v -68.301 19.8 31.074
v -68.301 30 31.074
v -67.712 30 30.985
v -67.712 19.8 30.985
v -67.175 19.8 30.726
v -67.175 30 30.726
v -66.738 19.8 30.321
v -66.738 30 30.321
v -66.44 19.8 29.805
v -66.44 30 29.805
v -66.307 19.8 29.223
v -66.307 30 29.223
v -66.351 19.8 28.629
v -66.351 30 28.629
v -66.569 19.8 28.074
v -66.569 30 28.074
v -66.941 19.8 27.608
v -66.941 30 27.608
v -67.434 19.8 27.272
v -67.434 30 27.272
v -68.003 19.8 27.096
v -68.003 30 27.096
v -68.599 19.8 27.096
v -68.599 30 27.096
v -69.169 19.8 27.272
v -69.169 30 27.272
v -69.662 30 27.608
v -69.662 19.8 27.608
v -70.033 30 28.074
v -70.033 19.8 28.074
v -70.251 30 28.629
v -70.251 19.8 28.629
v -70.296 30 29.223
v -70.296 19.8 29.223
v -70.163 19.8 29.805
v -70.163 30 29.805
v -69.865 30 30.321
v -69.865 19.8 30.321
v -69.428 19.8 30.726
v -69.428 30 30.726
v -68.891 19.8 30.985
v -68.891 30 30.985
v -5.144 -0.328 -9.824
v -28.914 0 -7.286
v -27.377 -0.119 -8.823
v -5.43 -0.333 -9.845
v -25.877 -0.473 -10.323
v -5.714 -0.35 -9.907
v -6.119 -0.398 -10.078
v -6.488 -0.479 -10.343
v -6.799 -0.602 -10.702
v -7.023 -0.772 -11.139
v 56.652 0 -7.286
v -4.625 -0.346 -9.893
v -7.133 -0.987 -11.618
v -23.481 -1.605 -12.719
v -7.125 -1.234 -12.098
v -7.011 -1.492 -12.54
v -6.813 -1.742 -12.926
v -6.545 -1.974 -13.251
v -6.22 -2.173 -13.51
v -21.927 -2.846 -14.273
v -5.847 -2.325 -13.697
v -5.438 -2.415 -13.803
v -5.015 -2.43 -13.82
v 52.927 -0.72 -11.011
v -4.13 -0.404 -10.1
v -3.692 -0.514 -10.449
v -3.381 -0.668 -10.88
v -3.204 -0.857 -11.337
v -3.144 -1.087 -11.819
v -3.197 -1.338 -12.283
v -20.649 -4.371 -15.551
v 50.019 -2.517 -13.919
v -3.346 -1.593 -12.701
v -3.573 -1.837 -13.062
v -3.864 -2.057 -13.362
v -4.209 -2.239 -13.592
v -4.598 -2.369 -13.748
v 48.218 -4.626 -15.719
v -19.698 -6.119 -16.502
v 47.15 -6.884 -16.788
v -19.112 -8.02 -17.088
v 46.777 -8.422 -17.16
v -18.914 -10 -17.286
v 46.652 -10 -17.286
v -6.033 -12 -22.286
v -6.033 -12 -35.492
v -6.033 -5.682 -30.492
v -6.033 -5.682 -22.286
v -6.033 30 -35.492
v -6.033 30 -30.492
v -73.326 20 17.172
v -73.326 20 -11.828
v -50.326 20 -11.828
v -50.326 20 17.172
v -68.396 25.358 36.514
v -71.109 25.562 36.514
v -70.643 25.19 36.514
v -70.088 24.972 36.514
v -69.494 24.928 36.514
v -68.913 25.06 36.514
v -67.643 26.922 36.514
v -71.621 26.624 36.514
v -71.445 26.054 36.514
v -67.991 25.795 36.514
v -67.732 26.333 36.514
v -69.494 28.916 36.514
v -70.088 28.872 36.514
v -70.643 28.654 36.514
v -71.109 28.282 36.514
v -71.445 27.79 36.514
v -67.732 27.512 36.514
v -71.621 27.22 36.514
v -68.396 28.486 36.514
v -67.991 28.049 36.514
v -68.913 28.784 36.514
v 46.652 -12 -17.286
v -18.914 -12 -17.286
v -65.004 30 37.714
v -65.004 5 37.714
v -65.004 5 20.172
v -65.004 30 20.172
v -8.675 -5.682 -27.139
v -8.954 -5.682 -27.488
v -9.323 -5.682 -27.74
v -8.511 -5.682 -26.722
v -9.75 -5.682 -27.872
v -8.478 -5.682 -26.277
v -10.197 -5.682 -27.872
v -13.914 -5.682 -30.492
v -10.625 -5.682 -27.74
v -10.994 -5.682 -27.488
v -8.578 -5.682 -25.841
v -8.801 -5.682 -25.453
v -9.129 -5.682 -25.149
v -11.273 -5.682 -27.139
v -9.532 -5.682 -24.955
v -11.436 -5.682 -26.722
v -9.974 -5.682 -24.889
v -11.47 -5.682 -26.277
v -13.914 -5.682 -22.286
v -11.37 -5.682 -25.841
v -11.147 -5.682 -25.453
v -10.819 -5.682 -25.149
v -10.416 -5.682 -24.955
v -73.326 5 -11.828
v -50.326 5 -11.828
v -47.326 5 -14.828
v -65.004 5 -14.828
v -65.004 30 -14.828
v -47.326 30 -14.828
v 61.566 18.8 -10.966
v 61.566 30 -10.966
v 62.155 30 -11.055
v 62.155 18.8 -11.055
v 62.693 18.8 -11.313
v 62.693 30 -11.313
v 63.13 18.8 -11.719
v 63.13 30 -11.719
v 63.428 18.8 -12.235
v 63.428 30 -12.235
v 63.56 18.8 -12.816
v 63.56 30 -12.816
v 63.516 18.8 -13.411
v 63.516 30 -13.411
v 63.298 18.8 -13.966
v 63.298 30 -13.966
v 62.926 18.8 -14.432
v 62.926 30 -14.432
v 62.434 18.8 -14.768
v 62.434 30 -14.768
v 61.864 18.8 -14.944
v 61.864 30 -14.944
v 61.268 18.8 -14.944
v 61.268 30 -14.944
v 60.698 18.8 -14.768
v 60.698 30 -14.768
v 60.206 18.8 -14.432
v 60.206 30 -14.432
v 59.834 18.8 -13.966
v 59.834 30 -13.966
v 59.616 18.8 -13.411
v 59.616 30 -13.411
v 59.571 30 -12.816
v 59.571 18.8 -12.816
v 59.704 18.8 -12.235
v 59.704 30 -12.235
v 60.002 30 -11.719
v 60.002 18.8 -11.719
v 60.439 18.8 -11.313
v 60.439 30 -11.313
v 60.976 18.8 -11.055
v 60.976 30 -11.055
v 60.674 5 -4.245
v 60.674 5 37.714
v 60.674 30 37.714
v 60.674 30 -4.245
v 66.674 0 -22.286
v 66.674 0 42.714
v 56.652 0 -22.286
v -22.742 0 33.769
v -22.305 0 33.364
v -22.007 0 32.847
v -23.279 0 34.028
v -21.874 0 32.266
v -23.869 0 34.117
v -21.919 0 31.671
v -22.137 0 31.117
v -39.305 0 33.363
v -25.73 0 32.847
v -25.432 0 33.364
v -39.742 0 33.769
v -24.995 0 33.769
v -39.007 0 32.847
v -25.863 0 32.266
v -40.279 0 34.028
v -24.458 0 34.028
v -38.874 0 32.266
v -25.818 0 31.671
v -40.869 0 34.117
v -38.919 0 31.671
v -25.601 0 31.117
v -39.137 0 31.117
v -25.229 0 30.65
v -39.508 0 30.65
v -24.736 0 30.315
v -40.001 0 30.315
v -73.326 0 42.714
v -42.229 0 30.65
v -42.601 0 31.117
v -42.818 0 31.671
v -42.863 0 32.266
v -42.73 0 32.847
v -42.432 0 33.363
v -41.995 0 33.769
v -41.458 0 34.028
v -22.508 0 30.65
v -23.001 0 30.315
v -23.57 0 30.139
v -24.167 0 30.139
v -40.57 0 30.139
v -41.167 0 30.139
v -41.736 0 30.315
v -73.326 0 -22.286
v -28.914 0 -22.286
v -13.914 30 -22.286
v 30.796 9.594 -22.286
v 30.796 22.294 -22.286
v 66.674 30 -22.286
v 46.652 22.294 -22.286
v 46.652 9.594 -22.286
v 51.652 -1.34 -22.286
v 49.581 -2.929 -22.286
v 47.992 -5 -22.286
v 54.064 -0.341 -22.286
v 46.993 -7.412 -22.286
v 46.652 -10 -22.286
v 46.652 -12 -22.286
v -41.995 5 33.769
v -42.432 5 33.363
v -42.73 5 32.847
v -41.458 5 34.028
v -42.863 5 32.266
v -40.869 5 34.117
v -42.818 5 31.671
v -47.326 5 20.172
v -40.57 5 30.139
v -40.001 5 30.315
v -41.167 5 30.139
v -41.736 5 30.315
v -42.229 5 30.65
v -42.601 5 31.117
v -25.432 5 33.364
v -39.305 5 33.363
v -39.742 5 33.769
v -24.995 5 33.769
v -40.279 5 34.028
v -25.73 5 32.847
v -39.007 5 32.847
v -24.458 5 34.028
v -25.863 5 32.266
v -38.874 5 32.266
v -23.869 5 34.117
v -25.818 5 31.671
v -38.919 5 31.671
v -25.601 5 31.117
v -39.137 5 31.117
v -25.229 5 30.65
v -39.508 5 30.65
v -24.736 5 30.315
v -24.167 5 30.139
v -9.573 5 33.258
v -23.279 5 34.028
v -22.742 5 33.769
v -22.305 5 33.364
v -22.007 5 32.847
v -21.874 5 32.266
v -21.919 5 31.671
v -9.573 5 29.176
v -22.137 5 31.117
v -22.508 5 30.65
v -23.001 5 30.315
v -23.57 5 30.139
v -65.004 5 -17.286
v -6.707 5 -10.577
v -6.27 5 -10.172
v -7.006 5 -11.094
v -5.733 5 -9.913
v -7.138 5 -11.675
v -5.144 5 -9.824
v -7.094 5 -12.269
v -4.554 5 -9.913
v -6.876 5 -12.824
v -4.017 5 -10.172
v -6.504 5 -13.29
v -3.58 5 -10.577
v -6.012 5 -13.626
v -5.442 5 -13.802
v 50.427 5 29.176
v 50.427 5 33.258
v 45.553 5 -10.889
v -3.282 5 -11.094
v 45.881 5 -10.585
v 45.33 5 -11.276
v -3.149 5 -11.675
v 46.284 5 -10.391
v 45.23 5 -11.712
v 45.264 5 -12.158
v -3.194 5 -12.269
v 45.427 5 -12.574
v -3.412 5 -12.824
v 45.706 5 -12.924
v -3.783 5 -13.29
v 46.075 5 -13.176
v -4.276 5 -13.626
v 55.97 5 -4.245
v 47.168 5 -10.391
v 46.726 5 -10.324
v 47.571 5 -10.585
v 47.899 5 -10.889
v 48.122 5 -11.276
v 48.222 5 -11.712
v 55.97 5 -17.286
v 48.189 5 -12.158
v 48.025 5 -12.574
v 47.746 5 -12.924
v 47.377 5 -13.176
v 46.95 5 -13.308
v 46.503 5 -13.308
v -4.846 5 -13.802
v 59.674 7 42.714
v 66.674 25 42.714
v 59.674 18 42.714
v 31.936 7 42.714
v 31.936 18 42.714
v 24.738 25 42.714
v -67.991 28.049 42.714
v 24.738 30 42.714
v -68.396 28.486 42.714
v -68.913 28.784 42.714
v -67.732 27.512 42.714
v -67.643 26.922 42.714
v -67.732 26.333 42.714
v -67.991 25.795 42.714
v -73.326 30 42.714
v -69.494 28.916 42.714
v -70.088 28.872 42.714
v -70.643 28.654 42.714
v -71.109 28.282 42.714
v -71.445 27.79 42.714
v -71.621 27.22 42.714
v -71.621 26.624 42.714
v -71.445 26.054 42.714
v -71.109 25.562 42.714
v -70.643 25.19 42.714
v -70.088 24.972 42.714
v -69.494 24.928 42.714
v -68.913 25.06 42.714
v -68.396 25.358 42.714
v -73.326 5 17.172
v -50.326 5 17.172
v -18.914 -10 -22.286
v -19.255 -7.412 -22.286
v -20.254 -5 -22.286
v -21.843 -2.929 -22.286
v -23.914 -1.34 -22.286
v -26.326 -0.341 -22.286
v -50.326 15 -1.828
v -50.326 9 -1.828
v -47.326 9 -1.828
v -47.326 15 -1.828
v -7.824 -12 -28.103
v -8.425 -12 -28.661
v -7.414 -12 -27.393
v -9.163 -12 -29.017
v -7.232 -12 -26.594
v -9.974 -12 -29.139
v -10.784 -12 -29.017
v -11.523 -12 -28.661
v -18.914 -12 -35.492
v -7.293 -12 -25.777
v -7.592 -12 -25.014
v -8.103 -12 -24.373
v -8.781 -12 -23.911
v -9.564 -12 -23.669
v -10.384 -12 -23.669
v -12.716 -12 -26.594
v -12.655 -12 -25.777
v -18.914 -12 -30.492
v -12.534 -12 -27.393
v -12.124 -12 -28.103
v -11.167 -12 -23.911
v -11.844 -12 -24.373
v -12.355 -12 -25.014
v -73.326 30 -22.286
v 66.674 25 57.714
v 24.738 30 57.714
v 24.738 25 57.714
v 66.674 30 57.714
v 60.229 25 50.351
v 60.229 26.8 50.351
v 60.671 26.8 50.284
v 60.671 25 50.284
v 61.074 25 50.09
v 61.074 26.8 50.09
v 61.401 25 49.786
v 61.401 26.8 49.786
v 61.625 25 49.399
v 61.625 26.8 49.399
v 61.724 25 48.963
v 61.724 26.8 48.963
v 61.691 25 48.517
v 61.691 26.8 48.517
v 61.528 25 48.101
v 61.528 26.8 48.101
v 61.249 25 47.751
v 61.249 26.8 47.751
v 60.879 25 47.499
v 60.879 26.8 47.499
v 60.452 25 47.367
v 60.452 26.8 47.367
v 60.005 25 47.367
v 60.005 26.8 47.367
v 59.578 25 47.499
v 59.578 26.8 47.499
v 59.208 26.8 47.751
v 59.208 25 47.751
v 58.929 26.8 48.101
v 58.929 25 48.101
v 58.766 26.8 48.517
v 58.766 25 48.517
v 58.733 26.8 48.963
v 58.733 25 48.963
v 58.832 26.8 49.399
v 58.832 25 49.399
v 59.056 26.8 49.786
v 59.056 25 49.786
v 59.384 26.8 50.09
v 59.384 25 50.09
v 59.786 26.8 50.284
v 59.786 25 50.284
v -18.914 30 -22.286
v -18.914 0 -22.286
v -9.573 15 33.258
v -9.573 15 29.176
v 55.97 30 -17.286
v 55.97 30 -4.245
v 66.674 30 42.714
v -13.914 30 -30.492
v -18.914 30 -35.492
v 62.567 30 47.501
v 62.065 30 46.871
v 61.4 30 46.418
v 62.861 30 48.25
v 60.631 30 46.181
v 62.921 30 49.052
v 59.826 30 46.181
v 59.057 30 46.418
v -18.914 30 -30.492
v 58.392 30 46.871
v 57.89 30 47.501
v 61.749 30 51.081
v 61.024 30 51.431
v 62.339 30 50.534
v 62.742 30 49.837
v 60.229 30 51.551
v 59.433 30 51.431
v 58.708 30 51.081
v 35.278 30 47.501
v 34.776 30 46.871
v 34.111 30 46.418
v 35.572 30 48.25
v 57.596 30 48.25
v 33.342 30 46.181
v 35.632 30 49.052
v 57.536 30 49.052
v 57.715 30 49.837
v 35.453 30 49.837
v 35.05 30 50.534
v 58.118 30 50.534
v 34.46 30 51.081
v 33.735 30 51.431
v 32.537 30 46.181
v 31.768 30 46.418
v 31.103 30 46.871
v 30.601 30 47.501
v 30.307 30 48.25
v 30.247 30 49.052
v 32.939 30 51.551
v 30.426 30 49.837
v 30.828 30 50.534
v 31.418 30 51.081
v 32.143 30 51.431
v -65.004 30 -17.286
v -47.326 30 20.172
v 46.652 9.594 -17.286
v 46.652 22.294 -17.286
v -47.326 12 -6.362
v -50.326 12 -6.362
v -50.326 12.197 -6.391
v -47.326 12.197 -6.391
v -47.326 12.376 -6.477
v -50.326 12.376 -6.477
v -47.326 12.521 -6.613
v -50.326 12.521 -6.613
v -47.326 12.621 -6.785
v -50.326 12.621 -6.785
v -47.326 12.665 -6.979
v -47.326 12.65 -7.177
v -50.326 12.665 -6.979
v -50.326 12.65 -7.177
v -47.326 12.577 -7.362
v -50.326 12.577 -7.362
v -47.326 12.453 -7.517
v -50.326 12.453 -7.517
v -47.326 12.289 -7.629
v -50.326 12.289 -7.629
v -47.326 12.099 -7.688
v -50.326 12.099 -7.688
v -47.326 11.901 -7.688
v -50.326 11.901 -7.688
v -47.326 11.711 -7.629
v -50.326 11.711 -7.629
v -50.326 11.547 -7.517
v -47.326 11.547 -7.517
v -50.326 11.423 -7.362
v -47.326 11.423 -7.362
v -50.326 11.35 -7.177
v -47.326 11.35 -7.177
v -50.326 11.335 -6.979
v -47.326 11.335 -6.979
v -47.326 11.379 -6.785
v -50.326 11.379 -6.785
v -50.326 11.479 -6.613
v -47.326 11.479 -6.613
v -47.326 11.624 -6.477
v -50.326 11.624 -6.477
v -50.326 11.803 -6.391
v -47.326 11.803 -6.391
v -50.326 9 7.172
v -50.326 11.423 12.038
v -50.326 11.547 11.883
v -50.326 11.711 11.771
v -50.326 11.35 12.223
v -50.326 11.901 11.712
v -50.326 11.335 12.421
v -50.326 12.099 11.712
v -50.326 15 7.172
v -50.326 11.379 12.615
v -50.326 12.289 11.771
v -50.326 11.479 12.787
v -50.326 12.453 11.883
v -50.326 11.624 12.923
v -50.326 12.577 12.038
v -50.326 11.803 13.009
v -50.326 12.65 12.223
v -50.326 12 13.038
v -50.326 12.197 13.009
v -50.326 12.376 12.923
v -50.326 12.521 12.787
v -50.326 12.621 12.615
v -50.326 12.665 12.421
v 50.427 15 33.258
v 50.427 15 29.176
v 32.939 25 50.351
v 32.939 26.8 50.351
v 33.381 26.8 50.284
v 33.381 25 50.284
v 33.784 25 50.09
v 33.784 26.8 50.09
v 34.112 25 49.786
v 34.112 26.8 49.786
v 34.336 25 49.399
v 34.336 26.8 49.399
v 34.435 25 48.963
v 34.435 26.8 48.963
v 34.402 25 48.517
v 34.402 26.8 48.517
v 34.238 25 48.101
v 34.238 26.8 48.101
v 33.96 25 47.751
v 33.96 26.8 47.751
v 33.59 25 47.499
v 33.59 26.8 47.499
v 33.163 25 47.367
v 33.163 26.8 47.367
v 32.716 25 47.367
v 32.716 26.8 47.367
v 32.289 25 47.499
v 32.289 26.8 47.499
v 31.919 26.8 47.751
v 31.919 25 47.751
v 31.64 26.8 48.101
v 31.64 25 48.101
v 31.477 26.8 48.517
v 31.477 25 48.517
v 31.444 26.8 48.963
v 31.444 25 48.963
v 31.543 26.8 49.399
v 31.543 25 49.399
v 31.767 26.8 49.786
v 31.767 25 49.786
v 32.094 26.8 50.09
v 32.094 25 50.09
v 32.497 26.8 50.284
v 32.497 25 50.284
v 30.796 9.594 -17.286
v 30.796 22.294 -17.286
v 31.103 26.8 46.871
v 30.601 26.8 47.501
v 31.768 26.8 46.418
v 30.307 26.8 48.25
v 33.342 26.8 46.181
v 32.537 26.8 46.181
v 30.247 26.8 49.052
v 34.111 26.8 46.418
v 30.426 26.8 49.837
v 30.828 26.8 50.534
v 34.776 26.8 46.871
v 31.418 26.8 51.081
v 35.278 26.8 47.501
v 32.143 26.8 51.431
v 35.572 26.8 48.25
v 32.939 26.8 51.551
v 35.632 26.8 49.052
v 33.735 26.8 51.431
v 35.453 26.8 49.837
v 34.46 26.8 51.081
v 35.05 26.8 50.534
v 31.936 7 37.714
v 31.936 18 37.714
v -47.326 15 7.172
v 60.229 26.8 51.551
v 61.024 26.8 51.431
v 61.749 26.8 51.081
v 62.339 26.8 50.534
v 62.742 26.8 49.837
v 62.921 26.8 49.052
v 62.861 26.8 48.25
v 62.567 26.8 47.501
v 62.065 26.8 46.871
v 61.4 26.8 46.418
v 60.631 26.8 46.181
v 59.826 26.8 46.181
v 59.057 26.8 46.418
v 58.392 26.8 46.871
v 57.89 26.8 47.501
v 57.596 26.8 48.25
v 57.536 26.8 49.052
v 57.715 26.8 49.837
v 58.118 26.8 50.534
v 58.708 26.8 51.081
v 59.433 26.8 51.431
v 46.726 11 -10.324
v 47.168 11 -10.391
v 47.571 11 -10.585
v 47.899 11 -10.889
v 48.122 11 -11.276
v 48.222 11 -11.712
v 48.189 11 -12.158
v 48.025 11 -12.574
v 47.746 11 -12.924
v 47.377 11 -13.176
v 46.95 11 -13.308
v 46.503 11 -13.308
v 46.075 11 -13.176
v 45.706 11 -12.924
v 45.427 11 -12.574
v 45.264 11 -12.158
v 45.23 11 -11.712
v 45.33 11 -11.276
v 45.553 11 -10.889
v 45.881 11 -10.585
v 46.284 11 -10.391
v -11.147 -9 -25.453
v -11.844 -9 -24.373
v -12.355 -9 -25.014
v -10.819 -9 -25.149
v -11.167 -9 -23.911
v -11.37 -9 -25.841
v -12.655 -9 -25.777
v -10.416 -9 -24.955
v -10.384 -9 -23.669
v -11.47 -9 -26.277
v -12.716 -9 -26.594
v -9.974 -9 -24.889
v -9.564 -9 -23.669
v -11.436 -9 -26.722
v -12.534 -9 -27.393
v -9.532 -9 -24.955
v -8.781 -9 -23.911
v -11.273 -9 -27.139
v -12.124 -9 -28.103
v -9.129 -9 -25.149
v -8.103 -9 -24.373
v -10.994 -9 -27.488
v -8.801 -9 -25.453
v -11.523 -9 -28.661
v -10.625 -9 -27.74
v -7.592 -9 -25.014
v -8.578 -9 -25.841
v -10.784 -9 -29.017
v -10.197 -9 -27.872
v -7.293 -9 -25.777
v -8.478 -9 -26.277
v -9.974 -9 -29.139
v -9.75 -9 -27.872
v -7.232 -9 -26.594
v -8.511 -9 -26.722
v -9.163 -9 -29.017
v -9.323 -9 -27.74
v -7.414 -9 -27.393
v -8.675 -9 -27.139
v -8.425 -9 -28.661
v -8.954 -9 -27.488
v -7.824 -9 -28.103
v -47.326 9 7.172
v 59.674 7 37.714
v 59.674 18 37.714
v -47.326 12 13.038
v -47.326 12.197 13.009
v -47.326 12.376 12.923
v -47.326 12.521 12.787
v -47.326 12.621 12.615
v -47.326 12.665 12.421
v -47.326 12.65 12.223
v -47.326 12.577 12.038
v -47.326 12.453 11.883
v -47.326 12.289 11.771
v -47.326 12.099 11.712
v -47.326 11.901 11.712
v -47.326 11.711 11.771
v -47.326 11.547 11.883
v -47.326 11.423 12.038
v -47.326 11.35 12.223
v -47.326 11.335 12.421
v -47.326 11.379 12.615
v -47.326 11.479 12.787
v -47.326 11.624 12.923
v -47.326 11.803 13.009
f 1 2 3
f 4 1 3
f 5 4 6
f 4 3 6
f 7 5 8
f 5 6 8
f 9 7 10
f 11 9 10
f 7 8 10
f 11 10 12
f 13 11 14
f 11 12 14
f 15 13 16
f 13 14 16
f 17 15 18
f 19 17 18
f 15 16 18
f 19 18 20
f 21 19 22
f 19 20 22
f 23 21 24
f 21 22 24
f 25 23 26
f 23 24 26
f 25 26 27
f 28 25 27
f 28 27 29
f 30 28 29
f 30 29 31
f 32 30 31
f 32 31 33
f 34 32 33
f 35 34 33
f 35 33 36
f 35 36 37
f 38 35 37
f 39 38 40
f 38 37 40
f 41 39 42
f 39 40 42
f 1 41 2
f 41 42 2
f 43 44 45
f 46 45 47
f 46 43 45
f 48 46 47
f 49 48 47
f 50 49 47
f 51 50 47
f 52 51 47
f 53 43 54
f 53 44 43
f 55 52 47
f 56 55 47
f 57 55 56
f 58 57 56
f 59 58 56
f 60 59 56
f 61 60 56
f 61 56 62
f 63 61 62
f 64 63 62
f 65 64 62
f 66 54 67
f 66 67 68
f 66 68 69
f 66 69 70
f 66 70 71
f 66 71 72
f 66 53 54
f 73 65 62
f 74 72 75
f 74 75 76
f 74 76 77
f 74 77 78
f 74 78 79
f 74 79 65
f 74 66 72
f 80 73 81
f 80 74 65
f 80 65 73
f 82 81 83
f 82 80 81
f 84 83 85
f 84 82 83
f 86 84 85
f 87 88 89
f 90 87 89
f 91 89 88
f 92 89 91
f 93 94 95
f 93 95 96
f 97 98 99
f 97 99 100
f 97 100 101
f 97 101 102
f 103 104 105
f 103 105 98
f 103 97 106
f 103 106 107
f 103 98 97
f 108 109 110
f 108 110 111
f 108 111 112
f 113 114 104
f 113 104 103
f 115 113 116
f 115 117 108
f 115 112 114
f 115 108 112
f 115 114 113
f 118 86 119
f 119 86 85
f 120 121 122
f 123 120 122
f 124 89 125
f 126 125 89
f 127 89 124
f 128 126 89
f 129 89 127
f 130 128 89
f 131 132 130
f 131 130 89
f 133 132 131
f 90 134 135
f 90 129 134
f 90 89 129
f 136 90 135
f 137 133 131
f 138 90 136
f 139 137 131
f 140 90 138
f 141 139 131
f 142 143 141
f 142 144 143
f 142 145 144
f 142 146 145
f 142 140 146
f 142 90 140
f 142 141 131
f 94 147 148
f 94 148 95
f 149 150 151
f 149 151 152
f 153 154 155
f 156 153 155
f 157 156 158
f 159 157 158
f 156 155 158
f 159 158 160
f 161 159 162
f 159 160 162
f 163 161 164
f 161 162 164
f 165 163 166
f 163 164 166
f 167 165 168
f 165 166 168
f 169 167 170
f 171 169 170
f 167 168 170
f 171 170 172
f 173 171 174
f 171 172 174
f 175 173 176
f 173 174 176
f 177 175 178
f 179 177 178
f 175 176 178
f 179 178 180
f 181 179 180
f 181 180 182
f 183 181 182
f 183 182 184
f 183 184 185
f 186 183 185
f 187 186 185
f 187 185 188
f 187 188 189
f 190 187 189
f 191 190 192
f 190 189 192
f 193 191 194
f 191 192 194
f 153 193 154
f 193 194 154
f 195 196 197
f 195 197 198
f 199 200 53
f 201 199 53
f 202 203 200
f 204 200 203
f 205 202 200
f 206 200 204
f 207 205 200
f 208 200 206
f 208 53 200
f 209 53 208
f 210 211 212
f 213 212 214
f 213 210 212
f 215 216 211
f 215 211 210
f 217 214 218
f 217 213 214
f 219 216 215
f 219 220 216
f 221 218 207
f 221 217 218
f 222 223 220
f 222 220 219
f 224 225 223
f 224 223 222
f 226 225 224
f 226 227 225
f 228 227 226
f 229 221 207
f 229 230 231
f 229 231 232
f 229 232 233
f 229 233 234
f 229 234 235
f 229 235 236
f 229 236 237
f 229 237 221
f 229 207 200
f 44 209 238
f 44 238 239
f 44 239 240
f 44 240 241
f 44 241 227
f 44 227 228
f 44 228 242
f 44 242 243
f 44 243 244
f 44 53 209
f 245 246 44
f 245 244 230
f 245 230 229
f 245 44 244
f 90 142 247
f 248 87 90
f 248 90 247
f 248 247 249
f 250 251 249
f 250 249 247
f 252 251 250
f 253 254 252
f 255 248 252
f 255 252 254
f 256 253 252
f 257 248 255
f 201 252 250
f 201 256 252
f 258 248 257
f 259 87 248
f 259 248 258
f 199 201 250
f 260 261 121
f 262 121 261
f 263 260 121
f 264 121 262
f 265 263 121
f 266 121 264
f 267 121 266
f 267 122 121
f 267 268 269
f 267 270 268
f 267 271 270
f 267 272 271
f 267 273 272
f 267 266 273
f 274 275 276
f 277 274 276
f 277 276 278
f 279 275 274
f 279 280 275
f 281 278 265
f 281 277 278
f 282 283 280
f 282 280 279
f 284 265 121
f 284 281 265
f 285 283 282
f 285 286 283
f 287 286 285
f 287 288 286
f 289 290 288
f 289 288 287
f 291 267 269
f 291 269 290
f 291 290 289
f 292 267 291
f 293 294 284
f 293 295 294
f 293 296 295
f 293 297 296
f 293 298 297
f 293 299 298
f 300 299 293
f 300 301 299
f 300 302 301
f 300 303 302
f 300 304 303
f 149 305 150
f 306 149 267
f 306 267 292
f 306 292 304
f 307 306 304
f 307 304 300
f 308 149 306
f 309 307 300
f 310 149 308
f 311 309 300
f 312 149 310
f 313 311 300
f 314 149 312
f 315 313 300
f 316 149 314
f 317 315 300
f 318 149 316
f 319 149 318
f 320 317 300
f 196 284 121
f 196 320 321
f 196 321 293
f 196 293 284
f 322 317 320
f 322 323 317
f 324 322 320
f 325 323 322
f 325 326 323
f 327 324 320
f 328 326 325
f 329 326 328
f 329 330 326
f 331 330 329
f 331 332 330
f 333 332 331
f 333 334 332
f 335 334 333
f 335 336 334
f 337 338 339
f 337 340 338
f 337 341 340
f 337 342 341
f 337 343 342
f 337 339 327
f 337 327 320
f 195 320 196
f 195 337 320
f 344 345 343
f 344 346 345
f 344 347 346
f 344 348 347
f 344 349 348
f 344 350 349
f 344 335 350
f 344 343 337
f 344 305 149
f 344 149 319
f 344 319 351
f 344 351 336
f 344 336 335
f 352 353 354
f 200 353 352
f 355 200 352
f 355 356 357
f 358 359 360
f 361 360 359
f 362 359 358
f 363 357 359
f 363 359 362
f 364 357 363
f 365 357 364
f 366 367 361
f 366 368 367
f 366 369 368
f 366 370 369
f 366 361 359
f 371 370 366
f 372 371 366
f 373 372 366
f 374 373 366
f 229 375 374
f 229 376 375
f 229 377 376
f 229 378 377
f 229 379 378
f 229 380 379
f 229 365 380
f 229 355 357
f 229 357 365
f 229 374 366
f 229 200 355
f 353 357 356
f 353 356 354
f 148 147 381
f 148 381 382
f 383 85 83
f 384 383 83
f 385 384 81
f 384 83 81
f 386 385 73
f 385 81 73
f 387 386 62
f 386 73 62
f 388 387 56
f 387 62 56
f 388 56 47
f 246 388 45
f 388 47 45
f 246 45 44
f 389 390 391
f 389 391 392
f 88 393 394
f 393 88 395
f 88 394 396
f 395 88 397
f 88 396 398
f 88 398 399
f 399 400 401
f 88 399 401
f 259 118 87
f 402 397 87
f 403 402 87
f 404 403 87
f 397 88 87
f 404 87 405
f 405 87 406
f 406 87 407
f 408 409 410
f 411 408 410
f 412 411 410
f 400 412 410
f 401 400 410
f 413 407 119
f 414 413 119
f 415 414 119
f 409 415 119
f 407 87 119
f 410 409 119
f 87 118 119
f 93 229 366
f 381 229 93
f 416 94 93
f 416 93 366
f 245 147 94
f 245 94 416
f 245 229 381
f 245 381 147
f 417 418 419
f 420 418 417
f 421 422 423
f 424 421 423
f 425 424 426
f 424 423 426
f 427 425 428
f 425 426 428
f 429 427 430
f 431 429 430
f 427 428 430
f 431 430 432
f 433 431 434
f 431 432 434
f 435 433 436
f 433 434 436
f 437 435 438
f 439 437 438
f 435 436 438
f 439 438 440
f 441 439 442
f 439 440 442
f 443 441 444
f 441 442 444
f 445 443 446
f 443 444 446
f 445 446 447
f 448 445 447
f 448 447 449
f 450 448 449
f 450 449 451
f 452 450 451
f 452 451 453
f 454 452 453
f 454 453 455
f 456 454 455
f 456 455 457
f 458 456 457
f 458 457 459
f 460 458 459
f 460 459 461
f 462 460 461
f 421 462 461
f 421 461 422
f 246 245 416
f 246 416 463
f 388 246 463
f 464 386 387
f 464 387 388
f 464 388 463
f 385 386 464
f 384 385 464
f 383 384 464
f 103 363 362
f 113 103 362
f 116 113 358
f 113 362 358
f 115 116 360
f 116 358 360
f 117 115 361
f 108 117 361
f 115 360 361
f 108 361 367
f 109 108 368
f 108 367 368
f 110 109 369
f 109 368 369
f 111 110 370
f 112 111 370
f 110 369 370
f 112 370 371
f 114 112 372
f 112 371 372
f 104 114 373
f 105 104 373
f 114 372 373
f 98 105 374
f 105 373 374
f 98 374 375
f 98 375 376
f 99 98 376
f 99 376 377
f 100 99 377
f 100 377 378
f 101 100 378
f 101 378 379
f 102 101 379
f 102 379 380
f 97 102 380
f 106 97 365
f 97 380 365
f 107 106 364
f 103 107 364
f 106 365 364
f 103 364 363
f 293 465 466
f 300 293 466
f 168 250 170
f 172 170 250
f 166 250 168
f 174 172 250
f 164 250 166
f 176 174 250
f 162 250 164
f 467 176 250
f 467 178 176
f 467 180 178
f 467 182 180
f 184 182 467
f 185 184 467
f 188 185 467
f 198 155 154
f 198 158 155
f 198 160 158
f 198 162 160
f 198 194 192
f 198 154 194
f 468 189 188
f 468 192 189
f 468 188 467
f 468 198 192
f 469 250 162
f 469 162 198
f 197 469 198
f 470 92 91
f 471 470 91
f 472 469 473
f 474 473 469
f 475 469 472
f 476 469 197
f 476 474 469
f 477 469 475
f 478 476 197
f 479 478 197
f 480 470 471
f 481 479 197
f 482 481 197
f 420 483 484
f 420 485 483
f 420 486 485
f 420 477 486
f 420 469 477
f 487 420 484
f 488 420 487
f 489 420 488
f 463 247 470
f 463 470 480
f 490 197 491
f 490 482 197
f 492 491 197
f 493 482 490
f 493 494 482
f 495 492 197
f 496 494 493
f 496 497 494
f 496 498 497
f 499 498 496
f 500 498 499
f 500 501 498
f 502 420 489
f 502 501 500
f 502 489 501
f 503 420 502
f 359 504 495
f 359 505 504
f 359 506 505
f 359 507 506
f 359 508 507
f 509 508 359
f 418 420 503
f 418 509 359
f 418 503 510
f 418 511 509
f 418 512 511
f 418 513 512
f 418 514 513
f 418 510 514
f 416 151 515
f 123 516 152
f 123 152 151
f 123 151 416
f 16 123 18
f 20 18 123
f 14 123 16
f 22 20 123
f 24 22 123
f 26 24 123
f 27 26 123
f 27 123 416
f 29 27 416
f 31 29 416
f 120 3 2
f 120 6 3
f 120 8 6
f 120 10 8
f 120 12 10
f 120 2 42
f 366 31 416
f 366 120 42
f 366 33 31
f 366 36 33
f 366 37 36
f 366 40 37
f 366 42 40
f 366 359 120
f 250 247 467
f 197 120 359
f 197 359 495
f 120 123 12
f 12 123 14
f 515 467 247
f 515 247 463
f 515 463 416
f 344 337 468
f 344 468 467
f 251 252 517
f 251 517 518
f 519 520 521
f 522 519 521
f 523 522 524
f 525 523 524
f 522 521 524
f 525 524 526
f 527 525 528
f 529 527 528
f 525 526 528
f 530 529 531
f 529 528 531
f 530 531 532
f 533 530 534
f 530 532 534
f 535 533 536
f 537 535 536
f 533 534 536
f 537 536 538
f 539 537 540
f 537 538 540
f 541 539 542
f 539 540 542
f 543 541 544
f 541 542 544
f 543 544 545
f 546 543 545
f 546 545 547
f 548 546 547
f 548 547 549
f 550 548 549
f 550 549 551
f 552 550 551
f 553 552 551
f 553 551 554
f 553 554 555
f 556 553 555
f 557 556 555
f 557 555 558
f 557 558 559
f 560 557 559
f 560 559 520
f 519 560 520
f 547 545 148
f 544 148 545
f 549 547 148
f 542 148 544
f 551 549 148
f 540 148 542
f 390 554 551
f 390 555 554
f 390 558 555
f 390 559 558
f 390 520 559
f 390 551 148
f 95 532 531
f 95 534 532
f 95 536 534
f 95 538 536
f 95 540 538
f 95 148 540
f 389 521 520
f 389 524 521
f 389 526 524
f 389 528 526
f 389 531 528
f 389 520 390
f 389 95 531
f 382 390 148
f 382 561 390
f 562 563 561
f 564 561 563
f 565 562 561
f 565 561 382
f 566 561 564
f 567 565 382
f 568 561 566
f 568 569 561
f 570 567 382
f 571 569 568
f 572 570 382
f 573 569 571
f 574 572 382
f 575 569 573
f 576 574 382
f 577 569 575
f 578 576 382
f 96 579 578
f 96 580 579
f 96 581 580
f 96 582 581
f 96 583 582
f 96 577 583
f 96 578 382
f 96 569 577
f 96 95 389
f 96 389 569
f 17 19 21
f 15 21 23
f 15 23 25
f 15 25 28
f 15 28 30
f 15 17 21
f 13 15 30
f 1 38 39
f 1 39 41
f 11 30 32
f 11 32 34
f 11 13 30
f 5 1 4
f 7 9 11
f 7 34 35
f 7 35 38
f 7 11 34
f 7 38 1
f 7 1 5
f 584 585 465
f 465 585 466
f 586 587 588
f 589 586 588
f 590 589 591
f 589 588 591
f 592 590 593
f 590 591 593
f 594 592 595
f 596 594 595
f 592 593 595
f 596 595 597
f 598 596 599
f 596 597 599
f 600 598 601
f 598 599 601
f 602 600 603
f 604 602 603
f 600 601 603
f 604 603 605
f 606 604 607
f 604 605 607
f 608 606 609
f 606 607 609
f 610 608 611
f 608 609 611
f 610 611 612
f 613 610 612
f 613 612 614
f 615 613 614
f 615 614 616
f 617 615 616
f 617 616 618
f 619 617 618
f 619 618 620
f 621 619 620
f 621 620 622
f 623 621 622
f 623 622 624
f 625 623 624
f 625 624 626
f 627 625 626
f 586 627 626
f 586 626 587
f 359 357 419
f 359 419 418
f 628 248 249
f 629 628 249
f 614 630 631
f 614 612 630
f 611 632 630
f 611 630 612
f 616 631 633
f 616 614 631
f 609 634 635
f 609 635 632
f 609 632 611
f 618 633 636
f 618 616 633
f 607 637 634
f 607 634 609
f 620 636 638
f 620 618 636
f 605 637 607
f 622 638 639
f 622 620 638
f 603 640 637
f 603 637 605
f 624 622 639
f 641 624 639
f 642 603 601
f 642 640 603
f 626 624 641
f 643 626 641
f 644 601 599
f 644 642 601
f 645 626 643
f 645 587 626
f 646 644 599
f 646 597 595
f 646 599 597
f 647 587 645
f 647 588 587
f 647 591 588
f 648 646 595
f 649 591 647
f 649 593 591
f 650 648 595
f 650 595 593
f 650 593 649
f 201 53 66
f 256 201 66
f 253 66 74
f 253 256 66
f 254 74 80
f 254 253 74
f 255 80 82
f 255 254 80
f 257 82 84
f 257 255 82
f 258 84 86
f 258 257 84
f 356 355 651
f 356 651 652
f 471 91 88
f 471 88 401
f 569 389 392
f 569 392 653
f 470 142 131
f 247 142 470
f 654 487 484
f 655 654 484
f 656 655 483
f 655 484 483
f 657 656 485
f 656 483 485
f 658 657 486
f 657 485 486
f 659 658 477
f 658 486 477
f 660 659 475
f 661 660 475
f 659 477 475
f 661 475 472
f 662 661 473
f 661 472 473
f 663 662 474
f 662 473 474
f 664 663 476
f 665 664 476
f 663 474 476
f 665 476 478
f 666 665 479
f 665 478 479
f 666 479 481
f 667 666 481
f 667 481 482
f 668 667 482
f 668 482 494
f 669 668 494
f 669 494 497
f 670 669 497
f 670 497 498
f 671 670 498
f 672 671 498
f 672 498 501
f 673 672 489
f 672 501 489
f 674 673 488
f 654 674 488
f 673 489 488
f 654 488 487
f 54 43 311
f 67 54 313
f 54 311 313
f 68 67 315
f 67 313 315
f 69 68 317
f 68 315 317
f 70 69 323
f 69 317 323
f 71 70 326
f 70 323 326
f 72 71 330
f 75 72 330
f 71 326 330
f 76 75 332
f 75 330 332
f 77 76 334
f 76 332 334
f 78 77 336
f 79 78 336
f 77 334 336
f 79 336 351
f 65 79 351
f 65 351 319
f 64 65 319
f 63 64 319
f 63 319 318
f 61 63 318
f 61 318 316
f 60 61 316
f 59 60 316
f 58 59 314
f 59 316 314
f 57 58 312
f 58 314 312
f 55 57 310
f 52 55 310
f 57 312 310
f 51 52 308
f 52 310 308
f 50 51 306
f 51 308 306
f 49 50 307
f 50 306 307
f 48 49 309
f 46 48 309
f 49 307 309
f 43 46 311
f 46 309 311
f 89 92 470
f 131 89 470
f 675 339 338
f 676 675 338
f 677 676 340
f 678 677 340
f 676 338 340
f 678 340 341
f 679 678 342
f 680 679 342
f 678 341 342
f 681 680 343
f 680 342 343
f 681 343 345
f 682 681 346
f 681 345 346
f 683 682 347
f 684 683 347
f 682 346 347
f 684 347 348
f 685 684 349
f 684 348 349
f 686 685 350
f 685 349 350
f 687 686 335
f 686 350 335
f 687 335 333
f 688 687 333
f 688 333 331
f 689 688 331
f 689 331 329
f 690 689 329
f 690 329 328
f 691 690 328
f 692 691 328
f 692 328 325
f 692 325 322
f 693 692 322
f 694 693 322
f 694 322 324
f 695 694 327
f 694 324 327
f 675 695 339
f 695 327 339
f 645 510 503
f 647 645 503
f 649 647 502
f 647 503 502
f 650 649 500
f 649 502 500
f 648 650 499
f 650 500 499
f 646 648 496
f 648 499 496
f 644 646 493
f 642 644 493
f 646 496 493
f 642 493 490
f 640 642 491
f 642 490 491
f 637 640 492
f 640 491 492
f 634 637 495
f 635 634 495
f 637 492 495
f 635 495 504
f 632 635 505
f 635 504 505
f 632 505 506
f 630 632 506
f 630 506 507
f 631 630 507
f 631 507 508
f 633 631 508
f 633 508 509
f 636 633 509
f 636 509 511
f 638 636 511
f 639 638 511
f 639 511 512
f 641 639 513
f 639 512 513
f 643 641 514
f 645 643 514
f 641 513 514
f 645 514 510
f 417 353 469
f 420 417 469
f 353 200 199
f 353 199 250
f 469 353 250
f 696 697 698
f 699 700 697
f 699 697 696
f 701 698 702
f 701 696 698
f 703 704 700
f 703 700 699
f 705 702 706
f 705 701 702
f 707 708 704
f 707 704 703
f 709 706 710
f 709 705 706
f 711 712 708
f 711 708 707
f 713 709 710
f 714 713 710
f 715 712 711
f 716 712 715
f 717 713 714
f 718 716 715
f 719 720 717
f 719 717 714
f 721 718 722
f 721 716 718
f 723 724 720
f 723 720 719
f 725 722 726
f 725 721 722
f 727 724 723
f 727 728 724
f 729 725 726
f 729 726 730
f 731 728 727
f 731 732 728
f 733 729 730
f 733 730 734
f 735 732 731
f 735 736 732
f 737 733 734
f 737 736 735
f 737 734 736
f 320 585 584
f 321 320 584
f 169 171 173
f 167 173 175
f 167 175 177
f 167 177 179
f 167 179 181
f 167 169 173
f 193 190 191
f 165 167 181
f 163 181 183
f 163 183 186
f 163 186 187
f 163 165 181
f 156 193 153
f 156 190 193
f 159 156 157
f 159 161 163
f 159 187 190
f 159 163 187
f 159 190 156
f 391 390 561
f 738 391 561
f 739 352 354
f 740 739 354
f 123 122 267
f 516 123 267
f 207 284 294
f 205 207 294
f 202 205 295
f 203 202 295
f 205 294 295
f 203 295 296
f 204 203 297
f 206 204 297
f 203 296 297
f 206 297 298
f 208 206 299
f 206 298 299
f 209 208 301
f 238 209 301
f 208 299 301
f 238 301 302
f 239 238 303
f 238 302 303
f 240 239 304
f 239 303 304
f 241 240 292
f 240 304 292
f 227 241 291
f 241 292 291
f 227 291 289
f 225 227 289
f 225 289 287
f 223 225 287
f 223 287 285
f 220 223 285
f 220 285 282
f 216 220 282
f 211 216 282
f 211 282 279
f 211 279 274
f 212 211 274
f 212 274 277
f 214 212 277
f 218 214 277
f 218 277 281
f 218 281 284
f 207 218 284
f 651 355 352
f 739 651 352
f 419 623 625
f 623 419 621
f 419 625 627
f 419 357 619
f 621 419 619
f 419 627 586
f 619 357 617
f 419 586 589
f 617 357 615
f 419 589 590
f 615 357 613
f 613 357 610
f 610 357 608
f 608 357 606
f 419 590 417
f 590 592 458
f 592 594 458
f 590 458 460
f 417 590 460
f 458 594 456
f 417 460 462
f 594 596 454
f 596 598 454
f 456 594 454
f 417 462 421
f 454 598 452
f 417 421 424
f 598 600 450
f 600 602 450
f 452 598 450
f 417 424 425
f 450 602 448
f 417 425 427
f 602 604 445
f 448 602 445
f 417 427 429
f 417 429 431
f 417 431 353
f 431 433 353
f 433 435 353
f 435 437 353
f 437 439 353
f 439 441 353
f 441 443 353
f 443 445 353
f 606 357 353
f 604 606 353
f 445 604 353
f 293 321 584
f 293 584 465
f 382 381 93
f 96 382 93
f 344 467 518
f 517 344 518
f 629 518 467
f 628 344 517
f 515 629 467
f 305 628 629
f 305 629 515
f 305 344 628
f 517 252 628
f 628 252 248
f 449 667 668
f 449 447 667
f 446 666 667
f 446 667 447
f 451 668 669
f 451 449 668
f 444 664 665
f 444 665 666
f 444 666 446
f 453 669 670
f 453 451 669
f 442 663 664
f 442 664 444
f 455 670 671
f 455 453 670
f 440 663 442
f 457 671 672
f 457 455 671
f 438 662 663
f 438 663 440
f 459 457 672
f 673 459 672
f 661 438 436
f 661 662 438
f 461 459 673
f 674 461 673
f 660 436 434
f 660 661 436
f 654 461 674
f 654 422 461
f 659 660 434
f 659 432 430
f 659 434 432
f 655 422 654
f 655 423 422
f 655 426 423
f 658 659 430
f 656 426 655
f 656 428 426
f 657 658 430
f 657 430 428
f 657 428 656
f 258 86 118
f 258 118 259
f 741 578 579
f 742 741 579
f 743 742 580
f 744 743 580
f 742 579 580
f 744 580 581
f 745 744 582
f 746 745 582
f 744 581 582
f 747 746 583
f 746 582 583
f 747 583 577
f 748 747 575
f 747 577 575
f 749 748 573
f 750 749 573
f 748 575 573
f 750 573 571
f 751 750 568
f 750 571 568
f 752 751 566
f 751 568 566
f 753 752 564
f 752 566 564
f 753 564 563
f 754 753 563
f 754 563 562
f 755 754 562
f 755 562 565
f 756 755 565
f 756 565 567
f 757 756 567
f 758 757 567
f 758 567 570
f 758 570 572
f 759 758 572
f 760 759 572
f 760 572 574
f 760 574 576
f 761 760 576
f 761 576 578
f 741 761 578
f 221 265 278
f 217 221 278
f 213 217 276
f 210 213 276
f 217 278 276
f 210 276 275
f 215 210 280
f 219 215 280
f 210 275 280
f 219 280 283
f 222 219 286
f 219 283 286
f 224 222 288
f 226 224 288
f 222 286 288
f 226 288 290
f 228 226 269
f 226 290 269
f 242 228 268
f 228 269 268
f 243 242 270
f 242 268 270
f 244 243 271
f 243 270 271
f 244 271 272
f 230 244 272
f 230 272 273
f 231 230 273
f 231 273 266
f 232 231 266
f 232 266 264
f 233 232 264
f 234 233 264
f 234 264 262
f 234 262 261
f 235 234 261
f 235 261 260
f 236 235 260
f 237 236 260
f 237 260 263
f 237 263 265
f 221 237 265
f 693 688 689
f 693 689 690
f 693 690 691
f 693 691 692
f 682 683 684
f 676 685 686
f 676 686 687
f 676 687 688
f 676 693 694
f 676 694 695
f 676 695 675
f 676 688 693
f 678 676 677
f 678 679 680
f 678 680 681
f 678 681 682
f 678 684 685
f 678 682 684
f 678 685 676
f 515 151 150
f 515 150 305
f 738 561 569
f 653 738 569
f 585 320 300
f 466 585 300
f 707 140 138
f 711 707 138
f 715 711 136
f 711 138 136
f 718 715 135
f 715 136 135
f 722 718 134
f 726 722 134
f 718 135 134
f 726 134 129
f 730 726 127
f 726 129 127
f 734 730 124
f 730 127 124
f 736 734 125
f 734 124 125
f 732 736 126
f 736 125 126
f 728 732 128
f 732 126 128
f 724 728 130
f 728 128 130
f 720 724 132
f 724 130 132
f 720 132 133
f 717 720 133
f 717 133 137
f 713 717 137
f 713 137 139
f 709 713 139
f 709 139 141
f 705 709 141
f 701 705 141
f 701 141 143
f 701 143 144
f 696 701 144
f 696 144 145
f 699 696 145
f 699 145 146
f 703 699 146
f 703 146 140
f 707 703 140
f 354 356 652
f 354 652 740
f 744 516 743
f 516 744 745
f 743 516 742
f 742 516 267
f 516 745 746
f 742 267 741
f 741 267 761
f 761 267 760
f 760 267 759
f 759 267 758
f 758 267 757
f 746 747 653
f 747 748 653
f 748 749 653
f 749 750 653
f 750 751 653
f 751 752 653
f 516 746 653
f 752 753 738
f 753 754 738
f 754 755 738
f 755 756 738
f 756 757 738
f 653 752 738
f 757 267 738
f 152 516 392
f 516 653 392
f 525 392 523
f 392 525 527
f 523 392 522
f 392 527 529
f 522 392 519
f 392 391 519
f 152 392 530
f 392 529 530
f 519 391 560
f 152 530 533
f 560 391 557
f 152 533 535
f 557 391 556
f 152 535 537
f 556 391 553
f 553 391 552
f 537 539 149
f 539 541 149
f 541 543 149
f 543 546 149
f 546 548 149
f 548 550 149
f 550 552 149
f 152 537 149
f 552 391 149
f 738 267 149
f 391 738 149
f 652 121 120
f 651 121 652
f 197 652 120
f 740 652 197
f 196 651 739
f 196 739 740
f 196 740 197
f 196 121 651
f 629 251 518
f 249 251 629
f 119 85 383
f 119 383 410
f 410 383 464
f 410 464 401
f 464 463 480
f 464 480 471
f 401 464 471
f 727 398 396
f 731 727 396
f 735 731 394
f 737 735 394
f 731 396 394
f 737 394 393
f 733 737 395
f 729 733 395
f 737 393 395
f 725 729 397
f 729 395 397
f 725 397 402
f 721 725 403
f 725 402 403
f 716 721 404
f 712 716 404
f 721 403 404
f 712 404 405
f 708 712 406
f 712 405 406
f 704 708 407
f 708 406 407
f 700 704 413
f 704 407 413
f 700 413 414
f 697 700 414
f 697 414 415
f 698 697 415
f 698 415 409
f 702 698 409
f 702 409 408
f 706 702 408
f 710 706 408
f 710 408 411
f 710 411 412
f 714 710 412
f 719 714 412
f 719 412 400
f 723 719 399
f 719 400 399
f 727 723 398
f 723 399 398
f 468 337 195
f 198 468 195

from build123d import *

# Parameters (mm, degrees)
SKETCH1_W            = 134
SKETCH1_H            = 55
BOSS_EXTRUDE1_DEPTH  = 5
BOSS_EXTRUDE2_DEPTH  = 14
SKETCH6_R            = 2
CUT_EXTRUDE2_DEPTH   = 16
BOSS_EXTRUDE4_DEPTH  = 10
SKETCH8_R            = 1.5
BOSS_EXTRUDE5_DEPTH  = 6
SKETCH9_W            = 9
SKETCH9_H            = 6
SKETCH9_R            = 0.666669423
CUT_EXTRUDE3_DEPTH   = 6
BOSS_EXTRUDE6_DEPTH  = 30
SKETCH11_W           = 26
SKETCH11_H           = 35
BOSS_EXTRUDE7_DEPTH  = 11
SKETCH12_R           = 2
CUT_EXTRUDE4_DEPTH   = 89.466034115
SKETCH13_W           = 29
SKETCH13_H           = 1
CUT_EXTRUDE5_DEPTH   = 23
BOSS_EXTRUDE8_DEPTH  = 12
SKETCH15_W           = 7.881166065
SKETCH15_H           = 6.31785274
BOSS_EXTRUDE9_DEPTH  = 8.206
SKETCH17_W           = 5
SKETCH17_H           = 42
BOSS_EXTRUDE10_DEPTH = 8.206
SKETCH18_W           = 27.737732315
SKETCH18_H           = 11
CUT_EXTRUDE6_DEPTH   = 5
SKETCH19_W           = 8.32170706
SKETCH19_H           = 17.542615134
SKETCH19_H_2         = 2.457384866
BOSS_EXTRUDE11_DEPTH = 25
SKETCH21_W           = 41.935962389
SKETCH21_H           = 5
BOSS_EXTRUDE12_DEPTH = 15
SKETCH22_R           = 2.7
CUT_EXTRUDE7_DEPTH   = 3.2
SKETCH23_R           = 1.5
CUT_EXTRUDE8_DEPTH   = 8.2
SKETCH24_R           = 2
CUT_EXTRUDE9_DEPTH   = 6.2
SKETCH25_R           = 2
CUT_EXTRUDE10_DEPTH  = 10.2
SKETCH26_W           = 4.703812025
SKETCH26_H           = 13.040944853
BOSS_EXTRUDE13_DEPTH = 25
SKETCH27_R           = 2
CUT_EXTRUDE11_DEPTH  = 11.2
SKETCH28_W           = 12.881166065
SKETCH28_H           = 42
BOSS_EXTRUDE14_DEPTH = 5
SKETCH29_R           = 1.5
CUT_EXTRUDE12_DEPTH  = 7
SKETCH30_R           = 2.75
CUT_EXTRUDE13_DEPTH  = 3
SKETCH31_W           = 15.85625148
SKETCH31_H           = 12.7
CUT_EXTRUDE14_DEPTH  = 8
FILLET1_R            = 10
FILLET2_R            = 10
FILLET3_R            = 10


with BuildPart() as part:
    # Sketch1 → Boss-Extrude1 (new body)
    with BuildSketch(Plane(origin=(0, 0, 0), x_dir=(1, 0, 0), z_dir=(0, 1, 0))):
        with Locations((-6.326180258, -10.214288954)):
            Rectangle(SKETCH1_W, SKETCH1_H)
    extrude(amount=BOSS_EXTRUDE1_DEPTH)

    # Sketch2 → Boss-Extrude2 (add)
    with BuildSketch(Plane(origin=(0, 5, 0), x_dir=(1, 0, 0), z_dir=(0, 1, 0))):
        Polygon((-73.326180258, 14.82832618), (-73.326180258, 11.82832618), (-50.326180258, 11.82832618), (-50.326180258, -17.17167382), (-73.326180258, -17.17167382), (-73.326180258, -20.17167382), (-47.326180258, -20.17167382), (-47.326180258, 14.82832618), align=None)
    extrude(amount=BOSS_EXTRUDE2_DEPTH)

    # Sketch6 → Cut-Extrude2 (cut)
    with BuildSketch(Plane(origin=(0, 5, 0), x_dir=(1, 0, 0), z_dir=(0, 1, 0))):
        with Locations(Location((-5.143804301, 11.824371315, 0), (0, 0, 270))):
            Circle(SKETCH6_R)
    extrude(amount=-CUT_EXTRUDE2_DEPTH, mode=Mode.SUBTRACT)

    # Sketch7 → Boss-Extrude4 (add)
    with BuildSketch(Plane(origin=(0, 5, 0), x_dir=(1, 0, 0), z_dir=(0, 1, 0))):
        Polygon((-9.572595602, -29.175628685), (12.857306, -29.175628685), (50.427404398, -29.175628685), (50.427404398, -33.25833673), (-9.572595602, -33.25833673), align=None)
    extrude(amount=BOSS_EXTRUDE4_DEPTH)

    # Sketch8 → Boss-Extrude5 (add)
    with BuildSketch(Plane(origin=(0, 5, 0), x_dir=(1, 0, 0), z_dir=(0, 1, 0))):
        with Locations(Location((46.72611237, 11.824371315, 0), (0, 0, 270))):
            Circle(SKETCH8_R)
    extrude(amount=BOSS_EXTRUDE5_DEPTH)

    # Sketch9 → Cut-Extrude3 (cut)
    with BuildSketch(Plane.ZY.offset(50.326180258)):
        with Locations((2.67167382, 12)):
            Rectangle(SKETCH9_W, SKETCH9_H)
        with Locations((-7.02832618, 12)):
            Circle(SKETCH9_R)
        with Locations((12.37167382, 12)):
            Circle(SKETCH9_R)
    extrude(amount=-CUT_EXTRUDE3_DEPTH, mode=Mode.SUBTRACT)

    # Sketch10 → Boss-Extrude6 (add)
    with BuildSketch(Plane(origin=(0, 0, 0), x_dir=(1, 0, 0), z_dir=(0, 1, 0))):
        Polygon((-73.326180258, 17.285711046), (-73.326180258, 22.285711046), (66.673819742, 22.285711046), (66.673819742, -42.714288954), (-73.326180258, -42.714288954), (-73.326180258, -37.714288954), (60.673819742, -37.714288954), (60.673819742, 17.285711046), align=None)
    extrude(amount=BOSS_EXTRUDE6_DEPTH)

    # Sketch11 → Boss-Extrude7 (add)
    with BuildSketch(Plane(origin=(0, 19, 0), x_dir=(1, 0, 0), z_dir=(0, 1, 0))):
        with Locations((-60.326180258, -2.67167382)):
            Rectangle(SKETCH11_W, SKETCH11_H)
    extrude(amount=BOSS_EXTRUDE7_DEPTH)

    # Sketch12 → Cut-Extrude4 (cut, through all)
    with BuildSketch(Plane(origin=(0, 5, 0), x_dir=(1, 0, 0), z_dir=(0, 1, 0))):
        with Locations(Location((-40.868568225, -32.116513497, 0), (0, 0, 270))):
            Circle(SKETCH12_R)
        with Locations(Location((-23.868568225, -32.116530453, 0), (0, 0, 270))):
            Circle(SKETCH12_R)
    extrude(amount=-CUT_EXTRUDE4_DEPTH, mode=Mode.SUBTRACT)

    # Sketch13 → Cut-Extrude5 (cut)
    with BuildSketch(Plane.ZY.offset(73.326180258)):
        with Locations((2.67167382, 19.5)):
            Rectangle(SKETCH13_W, SKETCH13_H)
    extrude(amount=-CUT_EXTRUDE5_DEPTH, mode=Mode.SUBTRACT)

    # Sketch14 → Boss-Extrude8 (add)
    with BuildSketch(Plane.XZ):
        Polygon((-13.914425371, -22.285711046), (46.65185498, -22.285711046), (46.65185498, -17.285711046), (-13.914425371, -17.285711046), (-18.914425371, -17.285711046), (-18.914425371, -22.285711046), align=None)
    extrude(amount=BOSS_EXTRUDE8_DEPTH)

    # Sketch15 → Boss-Extrude9 (add)
    with BuildSketch(Plane(origin=(0, 0, -22.285711046), x_dir=(-1, 0, 0), z_dir=(0, 0, -1))):
        with Locations((9.973842339, -8.84107363)):
            Rectangle(SKETCH15_W, SKETCH15_H)
    extrude(amount=BOSS_EXTRUDE9_DEPTH)

    # Sketch17 → Boss-Extrude10 (add)
    with BuildSketch(Plane(origin=(0, 0, -22.285711046), x_dir=(-1, 0, 0), z_dir=(0, 0, -1))):
        with Locations((16.414425371, 9)):
            Rectangle(SKETCH17_W, SKETCH17_H)
    extrude(amount=BOSS_EXTRUDE10_DEPTH)

    # Sketch18 → Cut-Extrude6 (cut)
    with BuildSketch(Plane.XY.offset(42.714288954)):
        with Locations((45.804953585, 12.5)):
            Rectangle(SKETCH18_W, SKETCH18_H)
    extrude(amount=-CUT_EXTRUDE6_DEPTH, mode=Mode.SUBTRACT)

    # Sketch19 → Boss-Extrude11 (add)
    with BuildSketch(Plane(origin=(0, 5, 0), x_dir=(1, 0, 0), z_dir=(0, 1, 0))):
        with Locations((-69.165326728, -28.942981387)):
            Rectangle(SKETCH19_W, SKETCH19_H)
        with Locations((-69.165326728, 16.057018613)):
            Rectangle(SKETCH19_W, SKETCH19_H_2)
    extrude(amount=BOSS_EXTRUDE11_DEPTH)

    # Sketch21 → Boss-Extrude12 (add)
    with BuildSketch(Plane.XY.offset(42.714288954)):
        with Locations((45.705838548, 27.5)):
            Rectangle(SKETCH21_W, SKETCH21_H)
    extrude(amount=BOSS_EXTRUDE12_DEPTH)

    # Sketch22 → Cut-Extrude7 (cut)
    with BuildSketch(Plane(origin=(0, 30, 0), x_dir=(1, 0, 0), z_dir=(0, 1, 0))):
        with Locations(Location((32.939337155, -48.85061207, 0), (0, 0, 270))):
            Circle(SKETCH22_R)
        with Locations(Location((60.22852181, -48.85061207, 0), (0, 0, 270))):
            Circle(SKETCH22_R)
    extrude(amount=-CUT_EXTRUDE7_DEPTH, mode=Mode.SUBTRACT)

    # Sketch23 → Cut-Extrude8 (cut)
    with BuildSketch(Plane(origin=(0, 30, 0), x_dir=(1, 0, 0), z_dir=(0, 1, 0))):
        with Locations(Location((60.22852181, -48.85061207, 0), (0, 0, 270))):
            Circle(SKETCH23_R)
        with Locations(Location((32.939337155, -48.85061207, 0), (0, 0, 270))):
            Circle(SKETCH23_R)
    extrude(amount=-CUT_EXTRUDE8_DEPTH, mode=Mode.SUBTRACT)

    # Sketch24 → Cut-Extrude9 (cut)
    with BuildSketch(Plane.XY.offset(42.714288954)):
        with Locations((-69.643270331, 26.922023127)):
            Circle(SKETCH24_R)
    extrude(amount=-CUT_EXTRUDE9_DEPTH, mode=Mode.SUBTRACT)

    # Sketch25 → Cut-Extrude10 (cut)
    with BuildSketch(Plane(origin=(0, 30, 0), x_dir=(1, 0, 0), z_dir=(0, 1, 0))):
        with Locations(Location((-68.301285916, -29.073958674, 0), (0, 0, 270))):
            Circle(SKETCH25_R)
    extrude(amount=-CUT_EXTRUDE10_DEPTH, mode=Mode.SUBTRACT)

    # Sketch26 → Boss-Extrude13 (add)
    with BuildSketch(Plane(origin=(0, 5, 0), x_dir=(1, 0, 0), z_dir=(0, 1, 0))):
        with Locations((58.32191373, 10.765238619)):
            Rectangle(SKETCH26_W, SKETCH26_H)
    extrude(amount=BOSS_EXTRUDE13_DEPTH)

    # Sketch27 → Cut-Extrude11 (cut)
    with BuildSketch(Plane(origin=(0, 30, 0), x_dir=(1, 0, 0), z_dir=(0, 1, 0))):
        with Locations(Location((61.565901952, 12.965958555, 0), (0, 0, 270))):
            Circle(SKETCH27_R)
    extrude(amount=-CUT_EXTRUDE11_DEPTH, mode=Mode.SUBTRACT)

    # Sketch28 → Boss-Extrude14 (add)
    with BuildSketch(Plane(origin=(0, 0, -30.491711046), x_dir=(-1, 0, 0), z_dir=(0, 0, -1))):
        with Locations((12.473842339, 9)):
            Rectangle(SKETCH28_W, SKETCH28_H)
    extrude(amount=BOSS_EXTRUDE14_DEPTH)

    # Sketch29 → Cut-Extrude12 (cut)
    with BuildSketch(Plane(origin=(0, -5.68214726, 0), x_dir=(1, 0, 0), z_dir=(0, 1, 0))):
        with Locations(Location((-9.973842338, 26.388711046, 0), (0, 0, 270))):
            Circle(SKETCH29_R)
    extrude(amount=-CUT_EXTRUDE12_DEPTH, mode=Mode.SUBTRACT)

    # Sketch30 → Cut-Extrude13 (cut)
    with BuildSketch(Plane.XZ.offset(12)):
        with Locations(Location((-9.973842338, -26.388711046, 0), (0, 0, 270))):
            Circle(SKETCH30_R)
    extrude(amount=-CUT_EXTRUDE13_DEPTH, mode=Mode.SUBTRACT)

    # Sketch31 → Cut-Extrude14 (cut)
    with BuildSketch(Plane(origin=(0, 0, -22.285711046), x_dir=(-1, 0, 0), z_dir=(0, 0, -1))):
        with Locations((-38.72372924, 15.943526368)):
            Rectangle(SKETCH31_W, SKETCH31_H)
    extrude(amount=-CUT_EXTRUDE14_DEPTH, mode=Mode.SUBTRACT)

    # Fillet1
    # the kernel refuses this fillet: 10 mm, written as the material it adds along each edge
    with BuildSketch(Plane(origin=(46.65185498, 0, -17.285711046), x_dir=(0, 0, 1), z_dir=(-1, 0, 0))) as fillet1_piece_1_section:
        with BuildLine():
            CenterArc((FILLET1_R, -FILLET1_R), FILLET1_R, 90, 90)
            Line((0, -FILLET1_R), (0, 0))
            Line((0, 0), (FILLET1_R, 0))
        make_face()
    fillet1_piece_1 = extrude(amount=65.56628035, mode=Mode.PRIVATE)
    fillet1_piece_1 = fillet1_piece_1 - Plane(origin=(-5.143804301, -2.281344891, -11.824371315), x_dir=(0, 0, 1), z_dir=(0, 1, 0)) * Cylinder(2, 172, mode=Mode.PRIVATE)
    add(fillet1_piece_1)

    # Fillet2
    fillet2_edges = [part.edges().sort_by_distance(p)[0] for p in [
        (-18.914425371, 0, -14.785711046),
    ]]
    fillet(fillet2_edges, radius=FILLET2_R)

    # Fillet3
    fillet3_edges = [part.edges().sort_by_distance(p)[0] for p in [
        (46.65185498, 0, -14.785711046),
    ]]
    fillet(fillet3_edges, radius=FILLET3_R)


solid = part.part
